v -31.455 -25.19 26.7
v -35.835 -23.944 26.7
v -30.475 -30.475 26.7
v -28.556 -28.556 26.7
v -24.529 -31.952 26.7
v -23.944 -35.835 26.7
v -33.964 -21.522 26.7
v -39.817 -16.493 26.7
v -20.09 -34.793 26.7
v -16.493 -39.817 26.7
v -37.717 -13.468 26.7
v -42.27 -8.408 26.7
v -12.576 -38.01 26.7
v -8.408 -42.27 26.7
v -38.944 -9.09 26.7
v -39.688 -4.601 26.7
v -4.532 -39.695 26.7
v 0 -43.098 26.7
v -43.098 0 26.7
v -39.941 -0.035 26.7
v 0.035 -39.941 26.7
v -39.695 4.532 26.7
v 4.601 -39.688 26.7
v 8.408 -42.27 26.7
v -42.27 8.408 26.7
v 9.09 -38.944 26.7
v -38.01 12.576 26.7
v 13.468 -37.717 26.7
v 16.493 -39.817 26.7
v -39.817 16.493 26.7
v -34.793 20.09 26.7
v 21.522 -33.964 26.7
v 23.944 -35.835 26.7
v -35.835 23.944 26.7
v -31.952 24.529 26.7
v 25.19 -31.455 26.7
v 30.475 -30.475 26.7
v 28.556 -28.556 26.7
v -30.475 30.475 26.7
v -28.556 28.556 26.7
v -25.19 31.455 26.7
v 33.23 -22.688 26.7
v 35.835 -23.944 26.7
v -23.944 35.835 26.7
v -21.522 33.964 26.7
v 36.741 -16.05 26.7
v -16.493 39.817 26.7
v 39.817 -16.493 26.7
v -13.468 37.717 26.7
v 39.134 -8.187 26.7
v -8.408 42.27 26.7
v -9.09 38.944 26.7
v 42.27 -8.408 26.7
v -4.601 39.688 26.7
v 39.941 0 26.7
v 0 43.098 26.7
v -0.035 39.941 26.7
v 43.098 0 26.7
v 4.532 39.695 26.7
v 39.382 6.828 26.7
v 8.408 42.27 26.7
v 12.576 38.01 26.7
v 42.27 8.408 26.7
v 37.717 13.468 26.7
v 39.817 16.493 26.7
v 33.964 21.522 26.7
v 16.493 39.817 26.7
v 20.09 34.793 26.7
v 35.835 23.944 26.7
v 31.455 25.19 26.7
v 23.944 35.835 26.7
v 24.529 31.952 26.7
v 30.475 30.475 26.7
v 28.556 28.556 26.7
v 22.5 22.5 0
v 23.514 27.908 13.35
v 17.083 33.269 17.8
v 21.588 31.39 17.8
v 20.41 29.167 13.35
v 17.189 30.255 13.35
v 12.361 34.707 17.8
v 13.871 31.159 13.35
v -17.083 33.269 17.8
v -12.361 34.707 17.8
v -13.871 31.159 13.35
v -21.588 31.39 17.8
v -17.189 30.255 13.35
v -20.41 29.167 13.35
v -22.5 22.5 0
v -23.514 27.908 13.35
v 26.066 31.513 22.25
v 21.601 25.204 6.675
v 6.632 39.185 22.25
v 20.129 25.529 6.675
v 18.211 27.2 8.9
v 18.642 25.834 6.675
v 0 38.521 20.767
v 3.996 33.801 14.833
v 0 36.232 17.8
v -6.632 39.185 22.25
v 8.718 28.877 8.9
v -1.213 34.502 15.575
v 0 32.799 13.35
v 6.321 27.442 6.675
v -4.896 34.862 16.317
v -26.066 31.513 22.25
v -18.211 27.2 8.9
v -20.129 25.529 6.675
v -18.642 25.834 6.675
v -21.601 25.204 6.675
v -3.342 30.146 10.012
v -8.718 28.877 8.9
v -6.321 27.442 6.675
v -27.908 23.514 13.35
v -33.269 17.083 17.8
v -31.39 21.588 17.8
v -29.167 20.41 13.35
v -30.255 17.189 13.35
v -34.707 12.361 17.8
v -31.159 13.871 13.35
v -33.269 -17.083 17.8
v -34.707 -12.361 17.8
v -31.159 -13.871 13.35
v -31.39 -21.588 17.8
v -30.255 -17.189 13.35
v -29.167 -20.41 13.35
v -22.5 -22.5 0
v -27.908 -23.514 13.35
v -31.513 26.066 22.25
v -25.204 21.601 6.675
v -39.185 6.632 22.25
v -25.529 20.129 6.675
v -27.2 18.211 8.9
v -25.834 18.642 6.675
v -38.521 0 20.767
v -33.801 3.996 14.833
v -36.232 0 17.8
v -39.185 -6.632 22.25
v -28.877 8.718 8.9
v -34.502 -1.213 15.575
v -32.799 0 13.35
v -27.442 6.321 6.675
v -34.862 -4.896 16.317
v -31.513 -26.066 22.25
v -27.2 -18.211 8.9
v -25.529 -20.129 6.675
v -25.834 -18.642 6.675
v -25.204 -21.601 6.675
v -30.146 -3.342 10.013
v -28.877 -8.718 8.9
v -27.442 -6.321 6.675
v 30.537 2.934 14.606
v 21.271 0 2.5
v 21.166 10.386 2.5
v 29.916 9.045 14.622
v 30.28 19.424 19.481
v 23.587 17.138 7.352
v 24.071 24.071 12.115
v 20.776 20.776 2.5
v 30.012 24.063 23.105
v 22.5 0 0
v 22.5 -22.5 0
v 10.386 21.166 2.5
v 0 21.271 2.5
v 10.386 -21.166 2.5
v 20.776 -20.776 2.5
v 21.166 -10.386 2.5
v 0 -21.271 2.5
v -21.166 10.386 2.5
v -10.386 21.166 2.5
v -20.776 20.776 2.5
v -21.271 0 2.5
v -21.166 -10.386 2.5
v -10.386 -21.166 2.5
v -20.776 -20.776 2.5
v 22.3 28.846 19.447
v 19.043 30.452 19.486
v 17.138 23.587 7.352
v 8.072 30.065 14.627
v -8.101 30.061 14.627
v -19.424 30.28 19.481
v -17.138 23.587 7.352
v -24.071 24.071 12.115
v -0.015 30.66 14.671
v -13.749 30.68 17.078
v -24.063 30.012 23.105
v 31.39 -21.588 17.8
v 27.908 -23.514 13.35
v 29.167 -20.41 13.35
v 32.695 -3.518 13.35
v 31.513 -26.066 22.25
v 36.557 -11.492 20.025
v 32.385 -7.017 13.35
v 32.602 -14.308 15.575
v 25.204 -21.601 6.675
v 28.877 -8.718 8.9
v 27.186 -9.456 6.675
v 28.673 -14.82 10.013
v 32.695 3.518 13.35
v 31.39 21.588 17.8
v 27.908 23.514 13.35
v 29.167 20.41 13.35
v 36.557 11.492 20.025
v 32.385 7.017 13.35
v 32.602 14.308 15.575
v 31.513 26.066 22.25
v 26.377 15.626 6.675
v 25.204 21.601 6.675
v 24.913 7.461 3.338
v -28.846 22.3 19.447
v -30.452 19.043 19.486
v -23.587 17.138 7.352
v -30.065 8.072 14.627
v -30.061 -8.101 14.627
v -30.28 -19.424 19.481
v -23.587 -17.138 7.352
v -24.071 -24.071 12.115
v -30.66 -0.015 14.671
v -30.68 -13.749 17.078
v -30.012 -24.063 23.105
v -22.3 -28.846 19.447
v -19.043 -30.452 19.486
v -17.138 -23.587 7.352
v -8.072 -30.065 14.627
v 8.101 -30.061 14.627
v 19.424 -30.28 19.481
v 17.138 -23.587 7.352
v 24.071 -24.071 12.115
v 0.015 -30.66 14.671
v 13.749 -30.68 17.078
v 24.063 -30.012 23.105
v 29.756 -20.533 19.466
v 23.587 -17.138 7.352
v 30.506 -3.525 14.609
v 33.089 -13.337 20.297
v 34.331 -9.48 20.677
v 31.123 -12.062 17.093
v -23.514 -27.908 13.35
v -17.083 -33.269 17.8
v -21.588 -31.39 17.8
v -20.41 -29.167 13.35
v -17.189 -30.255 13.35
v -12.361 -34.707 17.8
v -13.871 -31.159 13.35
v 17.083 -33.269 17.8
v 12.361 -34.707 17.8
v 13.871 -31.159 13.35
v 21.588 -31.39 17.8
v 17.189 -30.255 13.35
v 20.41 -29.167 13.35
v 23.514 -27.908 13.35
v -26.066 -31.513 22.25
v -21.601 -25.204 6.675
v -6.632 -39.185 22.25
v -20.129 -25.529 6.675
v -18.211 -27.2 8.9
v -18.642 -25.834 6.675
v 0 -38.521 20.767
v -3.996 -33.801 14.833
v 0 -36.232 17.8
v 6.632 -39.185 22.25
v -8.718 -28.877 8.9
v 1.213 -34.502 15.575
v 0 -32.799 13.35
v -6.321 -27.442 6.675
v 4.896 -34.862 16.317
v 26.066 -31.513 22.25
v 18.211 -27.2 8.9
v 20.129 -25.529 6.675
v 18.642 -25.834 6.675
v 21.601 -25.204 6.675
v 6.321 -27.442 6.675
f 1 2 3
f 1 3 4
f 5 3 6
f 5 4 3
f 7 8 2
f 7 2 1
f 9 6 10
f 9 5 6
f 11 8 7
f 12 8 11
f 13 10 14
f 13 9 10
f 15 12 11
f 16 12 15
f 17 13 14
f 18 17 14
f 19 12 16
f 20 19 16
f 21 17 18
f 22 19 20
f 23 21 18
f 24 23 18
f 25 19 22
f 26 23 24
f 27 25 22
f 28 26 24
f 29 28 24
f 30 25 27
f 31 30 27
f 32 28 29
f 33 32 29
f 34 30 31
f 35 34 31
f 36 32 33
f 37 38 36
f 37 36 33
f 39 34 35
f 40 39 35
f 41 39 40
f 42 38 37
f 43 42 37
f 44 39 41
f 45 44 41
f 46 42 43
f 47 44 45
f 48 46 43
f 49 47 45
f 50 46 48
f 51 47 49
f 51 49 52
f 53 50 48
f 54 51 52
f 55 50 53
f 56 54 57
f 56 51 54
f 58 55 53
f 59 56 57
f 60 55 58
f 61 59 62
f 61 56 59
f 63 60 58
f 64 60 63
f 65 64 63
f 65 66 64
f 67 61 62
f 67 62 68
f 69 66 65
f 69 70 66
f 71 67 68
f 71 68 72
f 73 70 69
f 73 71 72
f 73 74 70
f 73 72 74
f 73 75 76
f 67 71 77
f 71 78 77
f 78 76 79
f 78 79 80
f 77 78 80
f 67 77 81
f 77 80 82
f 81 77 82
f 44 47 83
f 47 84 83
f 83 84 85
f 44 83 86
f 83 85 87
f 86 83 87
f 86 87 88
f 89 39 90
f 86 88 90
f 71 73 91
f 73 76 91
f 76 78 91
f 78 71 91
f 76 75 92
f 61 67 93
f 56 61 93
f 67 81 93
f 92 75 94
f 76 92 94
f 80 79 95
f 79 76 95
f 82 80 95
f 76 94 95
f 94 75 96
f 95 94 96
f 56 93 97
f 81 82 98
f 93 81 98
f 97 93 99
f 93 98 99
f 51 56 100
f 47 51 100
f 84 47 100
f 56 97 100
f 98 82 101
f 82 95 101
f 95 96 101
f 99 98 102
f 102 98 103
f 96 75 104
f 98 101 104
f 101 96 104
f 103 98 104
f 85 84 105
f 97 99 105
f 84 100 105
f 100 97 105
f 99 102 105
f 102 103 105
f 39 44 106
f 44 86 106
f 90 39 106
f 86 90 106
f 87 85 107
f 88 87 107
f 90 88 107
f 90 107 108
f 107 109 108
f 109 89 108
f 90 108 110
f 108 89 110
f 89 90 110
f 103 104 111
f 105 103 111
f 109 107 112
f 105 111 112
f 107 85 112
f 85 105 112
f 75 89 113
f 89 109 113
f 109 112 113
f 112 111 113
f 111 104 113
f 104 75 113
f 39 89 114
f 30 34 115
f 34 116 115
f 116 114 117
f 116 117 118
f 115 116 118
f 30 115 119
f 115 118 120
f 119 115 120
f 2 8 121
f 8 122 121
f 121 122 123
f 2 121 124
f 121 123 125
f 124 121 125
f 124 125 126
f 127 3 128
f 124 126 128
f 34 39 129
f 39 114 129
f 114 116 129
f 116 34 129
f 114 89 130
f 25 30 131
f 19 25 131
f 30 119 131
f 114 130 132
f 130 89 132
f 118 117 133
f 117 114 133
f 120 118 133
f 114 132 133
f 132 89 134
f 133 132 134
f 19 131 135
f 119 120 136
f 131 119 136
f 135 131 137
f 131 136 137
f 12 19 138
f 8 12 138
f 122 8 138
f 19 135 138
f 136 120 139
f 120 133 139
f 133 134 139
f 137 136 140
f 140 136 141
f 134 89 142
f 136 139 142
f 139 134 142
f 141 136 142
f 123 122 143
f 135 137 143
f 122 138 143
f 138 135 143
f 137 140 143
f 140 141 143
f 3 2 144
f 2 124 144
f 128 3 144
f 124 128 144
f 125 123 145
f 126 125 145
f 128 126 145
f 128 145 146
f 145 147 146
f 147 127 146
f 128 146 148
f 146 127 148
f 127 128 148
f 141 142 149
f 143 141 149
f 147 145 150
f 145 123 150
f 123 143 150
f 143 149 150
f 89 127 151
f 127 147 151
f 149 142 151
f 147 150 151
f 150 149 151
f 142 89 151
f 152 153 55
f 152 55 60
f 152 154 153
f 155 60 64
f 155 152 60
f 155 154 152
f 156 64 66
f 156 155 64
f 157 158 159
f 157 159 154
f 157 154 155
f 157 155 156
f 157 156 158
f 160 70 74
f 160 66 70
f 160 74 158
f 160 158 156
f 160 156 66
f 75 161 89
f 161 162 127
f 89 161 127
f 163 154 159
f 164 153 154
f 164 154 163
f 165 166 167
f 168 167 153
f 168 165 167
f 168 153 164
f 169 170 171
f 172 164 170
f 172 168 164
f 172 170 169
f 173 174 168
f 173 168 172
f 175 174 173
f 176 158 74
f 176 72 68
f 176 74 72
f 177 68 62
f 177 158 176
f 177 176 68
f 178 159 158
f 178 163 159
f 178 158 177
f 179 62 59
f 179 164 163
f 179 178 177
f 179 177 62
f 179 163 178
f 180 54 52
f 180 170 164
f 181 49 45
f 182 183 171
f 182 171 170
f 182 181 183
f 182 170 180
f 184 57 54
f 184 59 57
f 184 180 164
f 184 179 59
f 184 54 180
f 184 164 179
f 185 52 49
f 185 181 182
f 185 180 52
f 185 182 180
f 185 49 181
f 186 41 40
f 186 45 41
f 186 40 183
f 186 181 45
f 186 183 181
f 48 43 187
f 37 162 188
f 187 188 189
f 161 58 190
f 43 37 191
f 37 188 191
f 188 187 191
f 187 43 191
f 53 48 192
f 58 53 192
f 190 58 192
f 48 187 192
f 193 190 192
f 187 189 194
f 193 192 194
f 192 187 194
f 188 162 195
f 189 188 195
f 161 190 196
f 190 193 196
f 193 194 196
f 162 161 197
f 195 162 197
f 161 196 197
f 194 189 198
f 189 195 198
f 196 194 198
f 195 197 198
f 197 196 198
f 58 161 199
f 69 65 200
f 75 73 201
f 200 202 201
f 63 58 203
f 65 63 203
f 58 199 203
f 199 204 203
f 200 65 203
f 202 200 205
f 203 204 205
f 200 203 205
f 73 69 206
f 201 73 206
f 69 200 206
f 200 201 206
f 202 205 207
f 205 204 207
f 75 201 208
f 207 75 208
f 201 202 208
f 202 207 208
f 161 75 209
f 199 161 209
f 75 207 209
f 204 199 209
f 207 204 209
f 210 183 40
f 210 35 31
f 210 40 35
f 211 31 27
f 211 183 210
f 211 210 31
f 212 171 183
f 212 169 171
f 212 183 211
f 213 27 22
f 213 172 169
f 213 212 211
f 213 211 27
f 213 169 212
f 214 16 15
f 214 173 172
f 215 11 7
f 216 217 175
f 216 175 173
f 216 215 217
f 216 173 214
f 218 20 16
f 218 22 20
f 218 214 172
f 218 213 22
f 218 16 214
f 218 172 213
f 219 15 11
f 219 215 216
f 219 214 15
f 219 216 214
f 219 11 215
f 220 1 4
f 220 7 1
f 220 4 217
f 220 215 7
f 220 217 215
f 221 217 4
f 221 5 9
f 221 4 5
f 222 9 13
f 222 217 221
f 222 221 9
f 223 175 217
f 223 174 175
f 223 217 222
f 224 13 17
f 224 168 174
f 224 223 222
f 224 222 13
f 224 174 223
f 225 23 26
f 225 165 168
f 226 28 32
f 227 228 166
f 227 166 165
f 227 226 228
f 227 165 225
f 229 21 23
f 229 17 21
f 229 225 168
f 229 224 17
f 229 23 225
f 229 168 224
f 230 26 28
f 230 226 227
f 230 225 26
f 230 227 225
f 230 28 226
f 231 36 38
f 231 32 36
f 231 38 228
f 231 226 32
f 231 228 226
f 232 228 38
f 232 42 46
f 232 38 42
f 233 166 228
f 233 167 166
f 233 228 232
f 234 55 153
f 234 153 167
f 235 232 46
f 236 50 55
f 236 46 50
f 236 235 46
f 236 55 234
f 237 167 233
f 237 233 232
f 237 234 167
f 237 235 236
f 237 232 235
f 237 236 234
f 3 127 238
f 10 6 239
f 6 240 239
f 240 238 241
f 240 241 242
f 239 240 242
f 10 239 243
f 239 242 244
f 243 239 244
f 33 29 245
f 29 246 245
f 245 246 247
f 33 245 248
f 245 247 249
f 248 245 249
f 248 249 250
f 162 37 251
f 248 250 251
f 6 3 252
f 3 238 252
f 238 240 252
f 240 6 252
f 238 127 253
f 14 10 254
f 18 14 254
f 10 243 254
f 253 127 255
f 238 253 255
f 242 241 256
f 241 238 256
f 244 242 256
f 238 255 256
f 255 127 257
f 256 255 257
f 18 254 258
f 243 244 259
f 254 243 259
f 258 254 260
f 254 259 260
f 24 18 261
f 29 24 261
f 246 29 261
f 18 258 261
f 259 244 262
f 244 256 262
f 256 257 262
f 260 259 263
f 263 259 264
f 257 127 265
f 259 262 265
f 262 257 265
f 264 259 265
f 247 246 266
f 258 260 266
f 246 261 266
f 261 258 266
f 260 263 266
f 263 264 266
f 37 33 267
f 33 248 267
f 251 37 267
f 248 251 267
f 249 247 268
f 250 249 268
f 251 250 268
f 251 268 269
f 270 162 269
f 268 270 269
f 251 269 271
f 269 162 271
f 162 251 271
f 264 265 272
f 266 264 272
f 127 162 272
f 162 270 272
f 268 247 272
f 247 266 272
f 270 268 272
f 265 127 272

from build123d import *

# Parameters (mm, degrees)
F2_R = 43.0981164558
F1_W = 45
F1_H = 45
F4_T = 2.5


# Not quite as in the source:
# - a shell that OpenCascade refuses in one call is made with other operations: the cavity is built on its own and cut out


with BuildPart() as f3:
    # F2 (on offset) → F3 section 0
    with BuildSketch(Plane.XY.offset(26.7)):
        Circle(F2_R)
    # F1 (on Top) → F3 section 1
    with BuildSketch(Plane.XY):
        Rectangle(F1_W, F1_H)
    loft()

    # F4: shell of thickness 2.5, made by hand


with BuildPart() as f4_core1:
    # F4_t2: copy of F3
    add(f3.part)

    # the walls: a layer under each face that stays
    f4_faces = [f4_core1.faces().sort_by_distance(p)[0] for p in [
        (31.1587338374, 13.8714675651, 13.35),
        (0, 32.7990582263, 13.35),
        (-32.7990582263, 0, 13.35),
        (0, -32.7990582263, 13.35),
        (31.1587338374, -13.8714675651, 13.35),
        (0, 0, 0),
    ]]
    thicken(f4_faces, amount=-F4_T, mode=Mode.SUBTRACT)


with BuildPart() as f3_1:
    add(f3.part)

    # what is left inside the walls is the cavity
    f4_cavity = [f4_core1.part.solids().sort_by_distance(p)[0] for p in [
        (0, -13.313542, 26.675),
    ]]
    add(f4_cavity, mode=Mode.SUBTRACT)


solid = f3_1.part
